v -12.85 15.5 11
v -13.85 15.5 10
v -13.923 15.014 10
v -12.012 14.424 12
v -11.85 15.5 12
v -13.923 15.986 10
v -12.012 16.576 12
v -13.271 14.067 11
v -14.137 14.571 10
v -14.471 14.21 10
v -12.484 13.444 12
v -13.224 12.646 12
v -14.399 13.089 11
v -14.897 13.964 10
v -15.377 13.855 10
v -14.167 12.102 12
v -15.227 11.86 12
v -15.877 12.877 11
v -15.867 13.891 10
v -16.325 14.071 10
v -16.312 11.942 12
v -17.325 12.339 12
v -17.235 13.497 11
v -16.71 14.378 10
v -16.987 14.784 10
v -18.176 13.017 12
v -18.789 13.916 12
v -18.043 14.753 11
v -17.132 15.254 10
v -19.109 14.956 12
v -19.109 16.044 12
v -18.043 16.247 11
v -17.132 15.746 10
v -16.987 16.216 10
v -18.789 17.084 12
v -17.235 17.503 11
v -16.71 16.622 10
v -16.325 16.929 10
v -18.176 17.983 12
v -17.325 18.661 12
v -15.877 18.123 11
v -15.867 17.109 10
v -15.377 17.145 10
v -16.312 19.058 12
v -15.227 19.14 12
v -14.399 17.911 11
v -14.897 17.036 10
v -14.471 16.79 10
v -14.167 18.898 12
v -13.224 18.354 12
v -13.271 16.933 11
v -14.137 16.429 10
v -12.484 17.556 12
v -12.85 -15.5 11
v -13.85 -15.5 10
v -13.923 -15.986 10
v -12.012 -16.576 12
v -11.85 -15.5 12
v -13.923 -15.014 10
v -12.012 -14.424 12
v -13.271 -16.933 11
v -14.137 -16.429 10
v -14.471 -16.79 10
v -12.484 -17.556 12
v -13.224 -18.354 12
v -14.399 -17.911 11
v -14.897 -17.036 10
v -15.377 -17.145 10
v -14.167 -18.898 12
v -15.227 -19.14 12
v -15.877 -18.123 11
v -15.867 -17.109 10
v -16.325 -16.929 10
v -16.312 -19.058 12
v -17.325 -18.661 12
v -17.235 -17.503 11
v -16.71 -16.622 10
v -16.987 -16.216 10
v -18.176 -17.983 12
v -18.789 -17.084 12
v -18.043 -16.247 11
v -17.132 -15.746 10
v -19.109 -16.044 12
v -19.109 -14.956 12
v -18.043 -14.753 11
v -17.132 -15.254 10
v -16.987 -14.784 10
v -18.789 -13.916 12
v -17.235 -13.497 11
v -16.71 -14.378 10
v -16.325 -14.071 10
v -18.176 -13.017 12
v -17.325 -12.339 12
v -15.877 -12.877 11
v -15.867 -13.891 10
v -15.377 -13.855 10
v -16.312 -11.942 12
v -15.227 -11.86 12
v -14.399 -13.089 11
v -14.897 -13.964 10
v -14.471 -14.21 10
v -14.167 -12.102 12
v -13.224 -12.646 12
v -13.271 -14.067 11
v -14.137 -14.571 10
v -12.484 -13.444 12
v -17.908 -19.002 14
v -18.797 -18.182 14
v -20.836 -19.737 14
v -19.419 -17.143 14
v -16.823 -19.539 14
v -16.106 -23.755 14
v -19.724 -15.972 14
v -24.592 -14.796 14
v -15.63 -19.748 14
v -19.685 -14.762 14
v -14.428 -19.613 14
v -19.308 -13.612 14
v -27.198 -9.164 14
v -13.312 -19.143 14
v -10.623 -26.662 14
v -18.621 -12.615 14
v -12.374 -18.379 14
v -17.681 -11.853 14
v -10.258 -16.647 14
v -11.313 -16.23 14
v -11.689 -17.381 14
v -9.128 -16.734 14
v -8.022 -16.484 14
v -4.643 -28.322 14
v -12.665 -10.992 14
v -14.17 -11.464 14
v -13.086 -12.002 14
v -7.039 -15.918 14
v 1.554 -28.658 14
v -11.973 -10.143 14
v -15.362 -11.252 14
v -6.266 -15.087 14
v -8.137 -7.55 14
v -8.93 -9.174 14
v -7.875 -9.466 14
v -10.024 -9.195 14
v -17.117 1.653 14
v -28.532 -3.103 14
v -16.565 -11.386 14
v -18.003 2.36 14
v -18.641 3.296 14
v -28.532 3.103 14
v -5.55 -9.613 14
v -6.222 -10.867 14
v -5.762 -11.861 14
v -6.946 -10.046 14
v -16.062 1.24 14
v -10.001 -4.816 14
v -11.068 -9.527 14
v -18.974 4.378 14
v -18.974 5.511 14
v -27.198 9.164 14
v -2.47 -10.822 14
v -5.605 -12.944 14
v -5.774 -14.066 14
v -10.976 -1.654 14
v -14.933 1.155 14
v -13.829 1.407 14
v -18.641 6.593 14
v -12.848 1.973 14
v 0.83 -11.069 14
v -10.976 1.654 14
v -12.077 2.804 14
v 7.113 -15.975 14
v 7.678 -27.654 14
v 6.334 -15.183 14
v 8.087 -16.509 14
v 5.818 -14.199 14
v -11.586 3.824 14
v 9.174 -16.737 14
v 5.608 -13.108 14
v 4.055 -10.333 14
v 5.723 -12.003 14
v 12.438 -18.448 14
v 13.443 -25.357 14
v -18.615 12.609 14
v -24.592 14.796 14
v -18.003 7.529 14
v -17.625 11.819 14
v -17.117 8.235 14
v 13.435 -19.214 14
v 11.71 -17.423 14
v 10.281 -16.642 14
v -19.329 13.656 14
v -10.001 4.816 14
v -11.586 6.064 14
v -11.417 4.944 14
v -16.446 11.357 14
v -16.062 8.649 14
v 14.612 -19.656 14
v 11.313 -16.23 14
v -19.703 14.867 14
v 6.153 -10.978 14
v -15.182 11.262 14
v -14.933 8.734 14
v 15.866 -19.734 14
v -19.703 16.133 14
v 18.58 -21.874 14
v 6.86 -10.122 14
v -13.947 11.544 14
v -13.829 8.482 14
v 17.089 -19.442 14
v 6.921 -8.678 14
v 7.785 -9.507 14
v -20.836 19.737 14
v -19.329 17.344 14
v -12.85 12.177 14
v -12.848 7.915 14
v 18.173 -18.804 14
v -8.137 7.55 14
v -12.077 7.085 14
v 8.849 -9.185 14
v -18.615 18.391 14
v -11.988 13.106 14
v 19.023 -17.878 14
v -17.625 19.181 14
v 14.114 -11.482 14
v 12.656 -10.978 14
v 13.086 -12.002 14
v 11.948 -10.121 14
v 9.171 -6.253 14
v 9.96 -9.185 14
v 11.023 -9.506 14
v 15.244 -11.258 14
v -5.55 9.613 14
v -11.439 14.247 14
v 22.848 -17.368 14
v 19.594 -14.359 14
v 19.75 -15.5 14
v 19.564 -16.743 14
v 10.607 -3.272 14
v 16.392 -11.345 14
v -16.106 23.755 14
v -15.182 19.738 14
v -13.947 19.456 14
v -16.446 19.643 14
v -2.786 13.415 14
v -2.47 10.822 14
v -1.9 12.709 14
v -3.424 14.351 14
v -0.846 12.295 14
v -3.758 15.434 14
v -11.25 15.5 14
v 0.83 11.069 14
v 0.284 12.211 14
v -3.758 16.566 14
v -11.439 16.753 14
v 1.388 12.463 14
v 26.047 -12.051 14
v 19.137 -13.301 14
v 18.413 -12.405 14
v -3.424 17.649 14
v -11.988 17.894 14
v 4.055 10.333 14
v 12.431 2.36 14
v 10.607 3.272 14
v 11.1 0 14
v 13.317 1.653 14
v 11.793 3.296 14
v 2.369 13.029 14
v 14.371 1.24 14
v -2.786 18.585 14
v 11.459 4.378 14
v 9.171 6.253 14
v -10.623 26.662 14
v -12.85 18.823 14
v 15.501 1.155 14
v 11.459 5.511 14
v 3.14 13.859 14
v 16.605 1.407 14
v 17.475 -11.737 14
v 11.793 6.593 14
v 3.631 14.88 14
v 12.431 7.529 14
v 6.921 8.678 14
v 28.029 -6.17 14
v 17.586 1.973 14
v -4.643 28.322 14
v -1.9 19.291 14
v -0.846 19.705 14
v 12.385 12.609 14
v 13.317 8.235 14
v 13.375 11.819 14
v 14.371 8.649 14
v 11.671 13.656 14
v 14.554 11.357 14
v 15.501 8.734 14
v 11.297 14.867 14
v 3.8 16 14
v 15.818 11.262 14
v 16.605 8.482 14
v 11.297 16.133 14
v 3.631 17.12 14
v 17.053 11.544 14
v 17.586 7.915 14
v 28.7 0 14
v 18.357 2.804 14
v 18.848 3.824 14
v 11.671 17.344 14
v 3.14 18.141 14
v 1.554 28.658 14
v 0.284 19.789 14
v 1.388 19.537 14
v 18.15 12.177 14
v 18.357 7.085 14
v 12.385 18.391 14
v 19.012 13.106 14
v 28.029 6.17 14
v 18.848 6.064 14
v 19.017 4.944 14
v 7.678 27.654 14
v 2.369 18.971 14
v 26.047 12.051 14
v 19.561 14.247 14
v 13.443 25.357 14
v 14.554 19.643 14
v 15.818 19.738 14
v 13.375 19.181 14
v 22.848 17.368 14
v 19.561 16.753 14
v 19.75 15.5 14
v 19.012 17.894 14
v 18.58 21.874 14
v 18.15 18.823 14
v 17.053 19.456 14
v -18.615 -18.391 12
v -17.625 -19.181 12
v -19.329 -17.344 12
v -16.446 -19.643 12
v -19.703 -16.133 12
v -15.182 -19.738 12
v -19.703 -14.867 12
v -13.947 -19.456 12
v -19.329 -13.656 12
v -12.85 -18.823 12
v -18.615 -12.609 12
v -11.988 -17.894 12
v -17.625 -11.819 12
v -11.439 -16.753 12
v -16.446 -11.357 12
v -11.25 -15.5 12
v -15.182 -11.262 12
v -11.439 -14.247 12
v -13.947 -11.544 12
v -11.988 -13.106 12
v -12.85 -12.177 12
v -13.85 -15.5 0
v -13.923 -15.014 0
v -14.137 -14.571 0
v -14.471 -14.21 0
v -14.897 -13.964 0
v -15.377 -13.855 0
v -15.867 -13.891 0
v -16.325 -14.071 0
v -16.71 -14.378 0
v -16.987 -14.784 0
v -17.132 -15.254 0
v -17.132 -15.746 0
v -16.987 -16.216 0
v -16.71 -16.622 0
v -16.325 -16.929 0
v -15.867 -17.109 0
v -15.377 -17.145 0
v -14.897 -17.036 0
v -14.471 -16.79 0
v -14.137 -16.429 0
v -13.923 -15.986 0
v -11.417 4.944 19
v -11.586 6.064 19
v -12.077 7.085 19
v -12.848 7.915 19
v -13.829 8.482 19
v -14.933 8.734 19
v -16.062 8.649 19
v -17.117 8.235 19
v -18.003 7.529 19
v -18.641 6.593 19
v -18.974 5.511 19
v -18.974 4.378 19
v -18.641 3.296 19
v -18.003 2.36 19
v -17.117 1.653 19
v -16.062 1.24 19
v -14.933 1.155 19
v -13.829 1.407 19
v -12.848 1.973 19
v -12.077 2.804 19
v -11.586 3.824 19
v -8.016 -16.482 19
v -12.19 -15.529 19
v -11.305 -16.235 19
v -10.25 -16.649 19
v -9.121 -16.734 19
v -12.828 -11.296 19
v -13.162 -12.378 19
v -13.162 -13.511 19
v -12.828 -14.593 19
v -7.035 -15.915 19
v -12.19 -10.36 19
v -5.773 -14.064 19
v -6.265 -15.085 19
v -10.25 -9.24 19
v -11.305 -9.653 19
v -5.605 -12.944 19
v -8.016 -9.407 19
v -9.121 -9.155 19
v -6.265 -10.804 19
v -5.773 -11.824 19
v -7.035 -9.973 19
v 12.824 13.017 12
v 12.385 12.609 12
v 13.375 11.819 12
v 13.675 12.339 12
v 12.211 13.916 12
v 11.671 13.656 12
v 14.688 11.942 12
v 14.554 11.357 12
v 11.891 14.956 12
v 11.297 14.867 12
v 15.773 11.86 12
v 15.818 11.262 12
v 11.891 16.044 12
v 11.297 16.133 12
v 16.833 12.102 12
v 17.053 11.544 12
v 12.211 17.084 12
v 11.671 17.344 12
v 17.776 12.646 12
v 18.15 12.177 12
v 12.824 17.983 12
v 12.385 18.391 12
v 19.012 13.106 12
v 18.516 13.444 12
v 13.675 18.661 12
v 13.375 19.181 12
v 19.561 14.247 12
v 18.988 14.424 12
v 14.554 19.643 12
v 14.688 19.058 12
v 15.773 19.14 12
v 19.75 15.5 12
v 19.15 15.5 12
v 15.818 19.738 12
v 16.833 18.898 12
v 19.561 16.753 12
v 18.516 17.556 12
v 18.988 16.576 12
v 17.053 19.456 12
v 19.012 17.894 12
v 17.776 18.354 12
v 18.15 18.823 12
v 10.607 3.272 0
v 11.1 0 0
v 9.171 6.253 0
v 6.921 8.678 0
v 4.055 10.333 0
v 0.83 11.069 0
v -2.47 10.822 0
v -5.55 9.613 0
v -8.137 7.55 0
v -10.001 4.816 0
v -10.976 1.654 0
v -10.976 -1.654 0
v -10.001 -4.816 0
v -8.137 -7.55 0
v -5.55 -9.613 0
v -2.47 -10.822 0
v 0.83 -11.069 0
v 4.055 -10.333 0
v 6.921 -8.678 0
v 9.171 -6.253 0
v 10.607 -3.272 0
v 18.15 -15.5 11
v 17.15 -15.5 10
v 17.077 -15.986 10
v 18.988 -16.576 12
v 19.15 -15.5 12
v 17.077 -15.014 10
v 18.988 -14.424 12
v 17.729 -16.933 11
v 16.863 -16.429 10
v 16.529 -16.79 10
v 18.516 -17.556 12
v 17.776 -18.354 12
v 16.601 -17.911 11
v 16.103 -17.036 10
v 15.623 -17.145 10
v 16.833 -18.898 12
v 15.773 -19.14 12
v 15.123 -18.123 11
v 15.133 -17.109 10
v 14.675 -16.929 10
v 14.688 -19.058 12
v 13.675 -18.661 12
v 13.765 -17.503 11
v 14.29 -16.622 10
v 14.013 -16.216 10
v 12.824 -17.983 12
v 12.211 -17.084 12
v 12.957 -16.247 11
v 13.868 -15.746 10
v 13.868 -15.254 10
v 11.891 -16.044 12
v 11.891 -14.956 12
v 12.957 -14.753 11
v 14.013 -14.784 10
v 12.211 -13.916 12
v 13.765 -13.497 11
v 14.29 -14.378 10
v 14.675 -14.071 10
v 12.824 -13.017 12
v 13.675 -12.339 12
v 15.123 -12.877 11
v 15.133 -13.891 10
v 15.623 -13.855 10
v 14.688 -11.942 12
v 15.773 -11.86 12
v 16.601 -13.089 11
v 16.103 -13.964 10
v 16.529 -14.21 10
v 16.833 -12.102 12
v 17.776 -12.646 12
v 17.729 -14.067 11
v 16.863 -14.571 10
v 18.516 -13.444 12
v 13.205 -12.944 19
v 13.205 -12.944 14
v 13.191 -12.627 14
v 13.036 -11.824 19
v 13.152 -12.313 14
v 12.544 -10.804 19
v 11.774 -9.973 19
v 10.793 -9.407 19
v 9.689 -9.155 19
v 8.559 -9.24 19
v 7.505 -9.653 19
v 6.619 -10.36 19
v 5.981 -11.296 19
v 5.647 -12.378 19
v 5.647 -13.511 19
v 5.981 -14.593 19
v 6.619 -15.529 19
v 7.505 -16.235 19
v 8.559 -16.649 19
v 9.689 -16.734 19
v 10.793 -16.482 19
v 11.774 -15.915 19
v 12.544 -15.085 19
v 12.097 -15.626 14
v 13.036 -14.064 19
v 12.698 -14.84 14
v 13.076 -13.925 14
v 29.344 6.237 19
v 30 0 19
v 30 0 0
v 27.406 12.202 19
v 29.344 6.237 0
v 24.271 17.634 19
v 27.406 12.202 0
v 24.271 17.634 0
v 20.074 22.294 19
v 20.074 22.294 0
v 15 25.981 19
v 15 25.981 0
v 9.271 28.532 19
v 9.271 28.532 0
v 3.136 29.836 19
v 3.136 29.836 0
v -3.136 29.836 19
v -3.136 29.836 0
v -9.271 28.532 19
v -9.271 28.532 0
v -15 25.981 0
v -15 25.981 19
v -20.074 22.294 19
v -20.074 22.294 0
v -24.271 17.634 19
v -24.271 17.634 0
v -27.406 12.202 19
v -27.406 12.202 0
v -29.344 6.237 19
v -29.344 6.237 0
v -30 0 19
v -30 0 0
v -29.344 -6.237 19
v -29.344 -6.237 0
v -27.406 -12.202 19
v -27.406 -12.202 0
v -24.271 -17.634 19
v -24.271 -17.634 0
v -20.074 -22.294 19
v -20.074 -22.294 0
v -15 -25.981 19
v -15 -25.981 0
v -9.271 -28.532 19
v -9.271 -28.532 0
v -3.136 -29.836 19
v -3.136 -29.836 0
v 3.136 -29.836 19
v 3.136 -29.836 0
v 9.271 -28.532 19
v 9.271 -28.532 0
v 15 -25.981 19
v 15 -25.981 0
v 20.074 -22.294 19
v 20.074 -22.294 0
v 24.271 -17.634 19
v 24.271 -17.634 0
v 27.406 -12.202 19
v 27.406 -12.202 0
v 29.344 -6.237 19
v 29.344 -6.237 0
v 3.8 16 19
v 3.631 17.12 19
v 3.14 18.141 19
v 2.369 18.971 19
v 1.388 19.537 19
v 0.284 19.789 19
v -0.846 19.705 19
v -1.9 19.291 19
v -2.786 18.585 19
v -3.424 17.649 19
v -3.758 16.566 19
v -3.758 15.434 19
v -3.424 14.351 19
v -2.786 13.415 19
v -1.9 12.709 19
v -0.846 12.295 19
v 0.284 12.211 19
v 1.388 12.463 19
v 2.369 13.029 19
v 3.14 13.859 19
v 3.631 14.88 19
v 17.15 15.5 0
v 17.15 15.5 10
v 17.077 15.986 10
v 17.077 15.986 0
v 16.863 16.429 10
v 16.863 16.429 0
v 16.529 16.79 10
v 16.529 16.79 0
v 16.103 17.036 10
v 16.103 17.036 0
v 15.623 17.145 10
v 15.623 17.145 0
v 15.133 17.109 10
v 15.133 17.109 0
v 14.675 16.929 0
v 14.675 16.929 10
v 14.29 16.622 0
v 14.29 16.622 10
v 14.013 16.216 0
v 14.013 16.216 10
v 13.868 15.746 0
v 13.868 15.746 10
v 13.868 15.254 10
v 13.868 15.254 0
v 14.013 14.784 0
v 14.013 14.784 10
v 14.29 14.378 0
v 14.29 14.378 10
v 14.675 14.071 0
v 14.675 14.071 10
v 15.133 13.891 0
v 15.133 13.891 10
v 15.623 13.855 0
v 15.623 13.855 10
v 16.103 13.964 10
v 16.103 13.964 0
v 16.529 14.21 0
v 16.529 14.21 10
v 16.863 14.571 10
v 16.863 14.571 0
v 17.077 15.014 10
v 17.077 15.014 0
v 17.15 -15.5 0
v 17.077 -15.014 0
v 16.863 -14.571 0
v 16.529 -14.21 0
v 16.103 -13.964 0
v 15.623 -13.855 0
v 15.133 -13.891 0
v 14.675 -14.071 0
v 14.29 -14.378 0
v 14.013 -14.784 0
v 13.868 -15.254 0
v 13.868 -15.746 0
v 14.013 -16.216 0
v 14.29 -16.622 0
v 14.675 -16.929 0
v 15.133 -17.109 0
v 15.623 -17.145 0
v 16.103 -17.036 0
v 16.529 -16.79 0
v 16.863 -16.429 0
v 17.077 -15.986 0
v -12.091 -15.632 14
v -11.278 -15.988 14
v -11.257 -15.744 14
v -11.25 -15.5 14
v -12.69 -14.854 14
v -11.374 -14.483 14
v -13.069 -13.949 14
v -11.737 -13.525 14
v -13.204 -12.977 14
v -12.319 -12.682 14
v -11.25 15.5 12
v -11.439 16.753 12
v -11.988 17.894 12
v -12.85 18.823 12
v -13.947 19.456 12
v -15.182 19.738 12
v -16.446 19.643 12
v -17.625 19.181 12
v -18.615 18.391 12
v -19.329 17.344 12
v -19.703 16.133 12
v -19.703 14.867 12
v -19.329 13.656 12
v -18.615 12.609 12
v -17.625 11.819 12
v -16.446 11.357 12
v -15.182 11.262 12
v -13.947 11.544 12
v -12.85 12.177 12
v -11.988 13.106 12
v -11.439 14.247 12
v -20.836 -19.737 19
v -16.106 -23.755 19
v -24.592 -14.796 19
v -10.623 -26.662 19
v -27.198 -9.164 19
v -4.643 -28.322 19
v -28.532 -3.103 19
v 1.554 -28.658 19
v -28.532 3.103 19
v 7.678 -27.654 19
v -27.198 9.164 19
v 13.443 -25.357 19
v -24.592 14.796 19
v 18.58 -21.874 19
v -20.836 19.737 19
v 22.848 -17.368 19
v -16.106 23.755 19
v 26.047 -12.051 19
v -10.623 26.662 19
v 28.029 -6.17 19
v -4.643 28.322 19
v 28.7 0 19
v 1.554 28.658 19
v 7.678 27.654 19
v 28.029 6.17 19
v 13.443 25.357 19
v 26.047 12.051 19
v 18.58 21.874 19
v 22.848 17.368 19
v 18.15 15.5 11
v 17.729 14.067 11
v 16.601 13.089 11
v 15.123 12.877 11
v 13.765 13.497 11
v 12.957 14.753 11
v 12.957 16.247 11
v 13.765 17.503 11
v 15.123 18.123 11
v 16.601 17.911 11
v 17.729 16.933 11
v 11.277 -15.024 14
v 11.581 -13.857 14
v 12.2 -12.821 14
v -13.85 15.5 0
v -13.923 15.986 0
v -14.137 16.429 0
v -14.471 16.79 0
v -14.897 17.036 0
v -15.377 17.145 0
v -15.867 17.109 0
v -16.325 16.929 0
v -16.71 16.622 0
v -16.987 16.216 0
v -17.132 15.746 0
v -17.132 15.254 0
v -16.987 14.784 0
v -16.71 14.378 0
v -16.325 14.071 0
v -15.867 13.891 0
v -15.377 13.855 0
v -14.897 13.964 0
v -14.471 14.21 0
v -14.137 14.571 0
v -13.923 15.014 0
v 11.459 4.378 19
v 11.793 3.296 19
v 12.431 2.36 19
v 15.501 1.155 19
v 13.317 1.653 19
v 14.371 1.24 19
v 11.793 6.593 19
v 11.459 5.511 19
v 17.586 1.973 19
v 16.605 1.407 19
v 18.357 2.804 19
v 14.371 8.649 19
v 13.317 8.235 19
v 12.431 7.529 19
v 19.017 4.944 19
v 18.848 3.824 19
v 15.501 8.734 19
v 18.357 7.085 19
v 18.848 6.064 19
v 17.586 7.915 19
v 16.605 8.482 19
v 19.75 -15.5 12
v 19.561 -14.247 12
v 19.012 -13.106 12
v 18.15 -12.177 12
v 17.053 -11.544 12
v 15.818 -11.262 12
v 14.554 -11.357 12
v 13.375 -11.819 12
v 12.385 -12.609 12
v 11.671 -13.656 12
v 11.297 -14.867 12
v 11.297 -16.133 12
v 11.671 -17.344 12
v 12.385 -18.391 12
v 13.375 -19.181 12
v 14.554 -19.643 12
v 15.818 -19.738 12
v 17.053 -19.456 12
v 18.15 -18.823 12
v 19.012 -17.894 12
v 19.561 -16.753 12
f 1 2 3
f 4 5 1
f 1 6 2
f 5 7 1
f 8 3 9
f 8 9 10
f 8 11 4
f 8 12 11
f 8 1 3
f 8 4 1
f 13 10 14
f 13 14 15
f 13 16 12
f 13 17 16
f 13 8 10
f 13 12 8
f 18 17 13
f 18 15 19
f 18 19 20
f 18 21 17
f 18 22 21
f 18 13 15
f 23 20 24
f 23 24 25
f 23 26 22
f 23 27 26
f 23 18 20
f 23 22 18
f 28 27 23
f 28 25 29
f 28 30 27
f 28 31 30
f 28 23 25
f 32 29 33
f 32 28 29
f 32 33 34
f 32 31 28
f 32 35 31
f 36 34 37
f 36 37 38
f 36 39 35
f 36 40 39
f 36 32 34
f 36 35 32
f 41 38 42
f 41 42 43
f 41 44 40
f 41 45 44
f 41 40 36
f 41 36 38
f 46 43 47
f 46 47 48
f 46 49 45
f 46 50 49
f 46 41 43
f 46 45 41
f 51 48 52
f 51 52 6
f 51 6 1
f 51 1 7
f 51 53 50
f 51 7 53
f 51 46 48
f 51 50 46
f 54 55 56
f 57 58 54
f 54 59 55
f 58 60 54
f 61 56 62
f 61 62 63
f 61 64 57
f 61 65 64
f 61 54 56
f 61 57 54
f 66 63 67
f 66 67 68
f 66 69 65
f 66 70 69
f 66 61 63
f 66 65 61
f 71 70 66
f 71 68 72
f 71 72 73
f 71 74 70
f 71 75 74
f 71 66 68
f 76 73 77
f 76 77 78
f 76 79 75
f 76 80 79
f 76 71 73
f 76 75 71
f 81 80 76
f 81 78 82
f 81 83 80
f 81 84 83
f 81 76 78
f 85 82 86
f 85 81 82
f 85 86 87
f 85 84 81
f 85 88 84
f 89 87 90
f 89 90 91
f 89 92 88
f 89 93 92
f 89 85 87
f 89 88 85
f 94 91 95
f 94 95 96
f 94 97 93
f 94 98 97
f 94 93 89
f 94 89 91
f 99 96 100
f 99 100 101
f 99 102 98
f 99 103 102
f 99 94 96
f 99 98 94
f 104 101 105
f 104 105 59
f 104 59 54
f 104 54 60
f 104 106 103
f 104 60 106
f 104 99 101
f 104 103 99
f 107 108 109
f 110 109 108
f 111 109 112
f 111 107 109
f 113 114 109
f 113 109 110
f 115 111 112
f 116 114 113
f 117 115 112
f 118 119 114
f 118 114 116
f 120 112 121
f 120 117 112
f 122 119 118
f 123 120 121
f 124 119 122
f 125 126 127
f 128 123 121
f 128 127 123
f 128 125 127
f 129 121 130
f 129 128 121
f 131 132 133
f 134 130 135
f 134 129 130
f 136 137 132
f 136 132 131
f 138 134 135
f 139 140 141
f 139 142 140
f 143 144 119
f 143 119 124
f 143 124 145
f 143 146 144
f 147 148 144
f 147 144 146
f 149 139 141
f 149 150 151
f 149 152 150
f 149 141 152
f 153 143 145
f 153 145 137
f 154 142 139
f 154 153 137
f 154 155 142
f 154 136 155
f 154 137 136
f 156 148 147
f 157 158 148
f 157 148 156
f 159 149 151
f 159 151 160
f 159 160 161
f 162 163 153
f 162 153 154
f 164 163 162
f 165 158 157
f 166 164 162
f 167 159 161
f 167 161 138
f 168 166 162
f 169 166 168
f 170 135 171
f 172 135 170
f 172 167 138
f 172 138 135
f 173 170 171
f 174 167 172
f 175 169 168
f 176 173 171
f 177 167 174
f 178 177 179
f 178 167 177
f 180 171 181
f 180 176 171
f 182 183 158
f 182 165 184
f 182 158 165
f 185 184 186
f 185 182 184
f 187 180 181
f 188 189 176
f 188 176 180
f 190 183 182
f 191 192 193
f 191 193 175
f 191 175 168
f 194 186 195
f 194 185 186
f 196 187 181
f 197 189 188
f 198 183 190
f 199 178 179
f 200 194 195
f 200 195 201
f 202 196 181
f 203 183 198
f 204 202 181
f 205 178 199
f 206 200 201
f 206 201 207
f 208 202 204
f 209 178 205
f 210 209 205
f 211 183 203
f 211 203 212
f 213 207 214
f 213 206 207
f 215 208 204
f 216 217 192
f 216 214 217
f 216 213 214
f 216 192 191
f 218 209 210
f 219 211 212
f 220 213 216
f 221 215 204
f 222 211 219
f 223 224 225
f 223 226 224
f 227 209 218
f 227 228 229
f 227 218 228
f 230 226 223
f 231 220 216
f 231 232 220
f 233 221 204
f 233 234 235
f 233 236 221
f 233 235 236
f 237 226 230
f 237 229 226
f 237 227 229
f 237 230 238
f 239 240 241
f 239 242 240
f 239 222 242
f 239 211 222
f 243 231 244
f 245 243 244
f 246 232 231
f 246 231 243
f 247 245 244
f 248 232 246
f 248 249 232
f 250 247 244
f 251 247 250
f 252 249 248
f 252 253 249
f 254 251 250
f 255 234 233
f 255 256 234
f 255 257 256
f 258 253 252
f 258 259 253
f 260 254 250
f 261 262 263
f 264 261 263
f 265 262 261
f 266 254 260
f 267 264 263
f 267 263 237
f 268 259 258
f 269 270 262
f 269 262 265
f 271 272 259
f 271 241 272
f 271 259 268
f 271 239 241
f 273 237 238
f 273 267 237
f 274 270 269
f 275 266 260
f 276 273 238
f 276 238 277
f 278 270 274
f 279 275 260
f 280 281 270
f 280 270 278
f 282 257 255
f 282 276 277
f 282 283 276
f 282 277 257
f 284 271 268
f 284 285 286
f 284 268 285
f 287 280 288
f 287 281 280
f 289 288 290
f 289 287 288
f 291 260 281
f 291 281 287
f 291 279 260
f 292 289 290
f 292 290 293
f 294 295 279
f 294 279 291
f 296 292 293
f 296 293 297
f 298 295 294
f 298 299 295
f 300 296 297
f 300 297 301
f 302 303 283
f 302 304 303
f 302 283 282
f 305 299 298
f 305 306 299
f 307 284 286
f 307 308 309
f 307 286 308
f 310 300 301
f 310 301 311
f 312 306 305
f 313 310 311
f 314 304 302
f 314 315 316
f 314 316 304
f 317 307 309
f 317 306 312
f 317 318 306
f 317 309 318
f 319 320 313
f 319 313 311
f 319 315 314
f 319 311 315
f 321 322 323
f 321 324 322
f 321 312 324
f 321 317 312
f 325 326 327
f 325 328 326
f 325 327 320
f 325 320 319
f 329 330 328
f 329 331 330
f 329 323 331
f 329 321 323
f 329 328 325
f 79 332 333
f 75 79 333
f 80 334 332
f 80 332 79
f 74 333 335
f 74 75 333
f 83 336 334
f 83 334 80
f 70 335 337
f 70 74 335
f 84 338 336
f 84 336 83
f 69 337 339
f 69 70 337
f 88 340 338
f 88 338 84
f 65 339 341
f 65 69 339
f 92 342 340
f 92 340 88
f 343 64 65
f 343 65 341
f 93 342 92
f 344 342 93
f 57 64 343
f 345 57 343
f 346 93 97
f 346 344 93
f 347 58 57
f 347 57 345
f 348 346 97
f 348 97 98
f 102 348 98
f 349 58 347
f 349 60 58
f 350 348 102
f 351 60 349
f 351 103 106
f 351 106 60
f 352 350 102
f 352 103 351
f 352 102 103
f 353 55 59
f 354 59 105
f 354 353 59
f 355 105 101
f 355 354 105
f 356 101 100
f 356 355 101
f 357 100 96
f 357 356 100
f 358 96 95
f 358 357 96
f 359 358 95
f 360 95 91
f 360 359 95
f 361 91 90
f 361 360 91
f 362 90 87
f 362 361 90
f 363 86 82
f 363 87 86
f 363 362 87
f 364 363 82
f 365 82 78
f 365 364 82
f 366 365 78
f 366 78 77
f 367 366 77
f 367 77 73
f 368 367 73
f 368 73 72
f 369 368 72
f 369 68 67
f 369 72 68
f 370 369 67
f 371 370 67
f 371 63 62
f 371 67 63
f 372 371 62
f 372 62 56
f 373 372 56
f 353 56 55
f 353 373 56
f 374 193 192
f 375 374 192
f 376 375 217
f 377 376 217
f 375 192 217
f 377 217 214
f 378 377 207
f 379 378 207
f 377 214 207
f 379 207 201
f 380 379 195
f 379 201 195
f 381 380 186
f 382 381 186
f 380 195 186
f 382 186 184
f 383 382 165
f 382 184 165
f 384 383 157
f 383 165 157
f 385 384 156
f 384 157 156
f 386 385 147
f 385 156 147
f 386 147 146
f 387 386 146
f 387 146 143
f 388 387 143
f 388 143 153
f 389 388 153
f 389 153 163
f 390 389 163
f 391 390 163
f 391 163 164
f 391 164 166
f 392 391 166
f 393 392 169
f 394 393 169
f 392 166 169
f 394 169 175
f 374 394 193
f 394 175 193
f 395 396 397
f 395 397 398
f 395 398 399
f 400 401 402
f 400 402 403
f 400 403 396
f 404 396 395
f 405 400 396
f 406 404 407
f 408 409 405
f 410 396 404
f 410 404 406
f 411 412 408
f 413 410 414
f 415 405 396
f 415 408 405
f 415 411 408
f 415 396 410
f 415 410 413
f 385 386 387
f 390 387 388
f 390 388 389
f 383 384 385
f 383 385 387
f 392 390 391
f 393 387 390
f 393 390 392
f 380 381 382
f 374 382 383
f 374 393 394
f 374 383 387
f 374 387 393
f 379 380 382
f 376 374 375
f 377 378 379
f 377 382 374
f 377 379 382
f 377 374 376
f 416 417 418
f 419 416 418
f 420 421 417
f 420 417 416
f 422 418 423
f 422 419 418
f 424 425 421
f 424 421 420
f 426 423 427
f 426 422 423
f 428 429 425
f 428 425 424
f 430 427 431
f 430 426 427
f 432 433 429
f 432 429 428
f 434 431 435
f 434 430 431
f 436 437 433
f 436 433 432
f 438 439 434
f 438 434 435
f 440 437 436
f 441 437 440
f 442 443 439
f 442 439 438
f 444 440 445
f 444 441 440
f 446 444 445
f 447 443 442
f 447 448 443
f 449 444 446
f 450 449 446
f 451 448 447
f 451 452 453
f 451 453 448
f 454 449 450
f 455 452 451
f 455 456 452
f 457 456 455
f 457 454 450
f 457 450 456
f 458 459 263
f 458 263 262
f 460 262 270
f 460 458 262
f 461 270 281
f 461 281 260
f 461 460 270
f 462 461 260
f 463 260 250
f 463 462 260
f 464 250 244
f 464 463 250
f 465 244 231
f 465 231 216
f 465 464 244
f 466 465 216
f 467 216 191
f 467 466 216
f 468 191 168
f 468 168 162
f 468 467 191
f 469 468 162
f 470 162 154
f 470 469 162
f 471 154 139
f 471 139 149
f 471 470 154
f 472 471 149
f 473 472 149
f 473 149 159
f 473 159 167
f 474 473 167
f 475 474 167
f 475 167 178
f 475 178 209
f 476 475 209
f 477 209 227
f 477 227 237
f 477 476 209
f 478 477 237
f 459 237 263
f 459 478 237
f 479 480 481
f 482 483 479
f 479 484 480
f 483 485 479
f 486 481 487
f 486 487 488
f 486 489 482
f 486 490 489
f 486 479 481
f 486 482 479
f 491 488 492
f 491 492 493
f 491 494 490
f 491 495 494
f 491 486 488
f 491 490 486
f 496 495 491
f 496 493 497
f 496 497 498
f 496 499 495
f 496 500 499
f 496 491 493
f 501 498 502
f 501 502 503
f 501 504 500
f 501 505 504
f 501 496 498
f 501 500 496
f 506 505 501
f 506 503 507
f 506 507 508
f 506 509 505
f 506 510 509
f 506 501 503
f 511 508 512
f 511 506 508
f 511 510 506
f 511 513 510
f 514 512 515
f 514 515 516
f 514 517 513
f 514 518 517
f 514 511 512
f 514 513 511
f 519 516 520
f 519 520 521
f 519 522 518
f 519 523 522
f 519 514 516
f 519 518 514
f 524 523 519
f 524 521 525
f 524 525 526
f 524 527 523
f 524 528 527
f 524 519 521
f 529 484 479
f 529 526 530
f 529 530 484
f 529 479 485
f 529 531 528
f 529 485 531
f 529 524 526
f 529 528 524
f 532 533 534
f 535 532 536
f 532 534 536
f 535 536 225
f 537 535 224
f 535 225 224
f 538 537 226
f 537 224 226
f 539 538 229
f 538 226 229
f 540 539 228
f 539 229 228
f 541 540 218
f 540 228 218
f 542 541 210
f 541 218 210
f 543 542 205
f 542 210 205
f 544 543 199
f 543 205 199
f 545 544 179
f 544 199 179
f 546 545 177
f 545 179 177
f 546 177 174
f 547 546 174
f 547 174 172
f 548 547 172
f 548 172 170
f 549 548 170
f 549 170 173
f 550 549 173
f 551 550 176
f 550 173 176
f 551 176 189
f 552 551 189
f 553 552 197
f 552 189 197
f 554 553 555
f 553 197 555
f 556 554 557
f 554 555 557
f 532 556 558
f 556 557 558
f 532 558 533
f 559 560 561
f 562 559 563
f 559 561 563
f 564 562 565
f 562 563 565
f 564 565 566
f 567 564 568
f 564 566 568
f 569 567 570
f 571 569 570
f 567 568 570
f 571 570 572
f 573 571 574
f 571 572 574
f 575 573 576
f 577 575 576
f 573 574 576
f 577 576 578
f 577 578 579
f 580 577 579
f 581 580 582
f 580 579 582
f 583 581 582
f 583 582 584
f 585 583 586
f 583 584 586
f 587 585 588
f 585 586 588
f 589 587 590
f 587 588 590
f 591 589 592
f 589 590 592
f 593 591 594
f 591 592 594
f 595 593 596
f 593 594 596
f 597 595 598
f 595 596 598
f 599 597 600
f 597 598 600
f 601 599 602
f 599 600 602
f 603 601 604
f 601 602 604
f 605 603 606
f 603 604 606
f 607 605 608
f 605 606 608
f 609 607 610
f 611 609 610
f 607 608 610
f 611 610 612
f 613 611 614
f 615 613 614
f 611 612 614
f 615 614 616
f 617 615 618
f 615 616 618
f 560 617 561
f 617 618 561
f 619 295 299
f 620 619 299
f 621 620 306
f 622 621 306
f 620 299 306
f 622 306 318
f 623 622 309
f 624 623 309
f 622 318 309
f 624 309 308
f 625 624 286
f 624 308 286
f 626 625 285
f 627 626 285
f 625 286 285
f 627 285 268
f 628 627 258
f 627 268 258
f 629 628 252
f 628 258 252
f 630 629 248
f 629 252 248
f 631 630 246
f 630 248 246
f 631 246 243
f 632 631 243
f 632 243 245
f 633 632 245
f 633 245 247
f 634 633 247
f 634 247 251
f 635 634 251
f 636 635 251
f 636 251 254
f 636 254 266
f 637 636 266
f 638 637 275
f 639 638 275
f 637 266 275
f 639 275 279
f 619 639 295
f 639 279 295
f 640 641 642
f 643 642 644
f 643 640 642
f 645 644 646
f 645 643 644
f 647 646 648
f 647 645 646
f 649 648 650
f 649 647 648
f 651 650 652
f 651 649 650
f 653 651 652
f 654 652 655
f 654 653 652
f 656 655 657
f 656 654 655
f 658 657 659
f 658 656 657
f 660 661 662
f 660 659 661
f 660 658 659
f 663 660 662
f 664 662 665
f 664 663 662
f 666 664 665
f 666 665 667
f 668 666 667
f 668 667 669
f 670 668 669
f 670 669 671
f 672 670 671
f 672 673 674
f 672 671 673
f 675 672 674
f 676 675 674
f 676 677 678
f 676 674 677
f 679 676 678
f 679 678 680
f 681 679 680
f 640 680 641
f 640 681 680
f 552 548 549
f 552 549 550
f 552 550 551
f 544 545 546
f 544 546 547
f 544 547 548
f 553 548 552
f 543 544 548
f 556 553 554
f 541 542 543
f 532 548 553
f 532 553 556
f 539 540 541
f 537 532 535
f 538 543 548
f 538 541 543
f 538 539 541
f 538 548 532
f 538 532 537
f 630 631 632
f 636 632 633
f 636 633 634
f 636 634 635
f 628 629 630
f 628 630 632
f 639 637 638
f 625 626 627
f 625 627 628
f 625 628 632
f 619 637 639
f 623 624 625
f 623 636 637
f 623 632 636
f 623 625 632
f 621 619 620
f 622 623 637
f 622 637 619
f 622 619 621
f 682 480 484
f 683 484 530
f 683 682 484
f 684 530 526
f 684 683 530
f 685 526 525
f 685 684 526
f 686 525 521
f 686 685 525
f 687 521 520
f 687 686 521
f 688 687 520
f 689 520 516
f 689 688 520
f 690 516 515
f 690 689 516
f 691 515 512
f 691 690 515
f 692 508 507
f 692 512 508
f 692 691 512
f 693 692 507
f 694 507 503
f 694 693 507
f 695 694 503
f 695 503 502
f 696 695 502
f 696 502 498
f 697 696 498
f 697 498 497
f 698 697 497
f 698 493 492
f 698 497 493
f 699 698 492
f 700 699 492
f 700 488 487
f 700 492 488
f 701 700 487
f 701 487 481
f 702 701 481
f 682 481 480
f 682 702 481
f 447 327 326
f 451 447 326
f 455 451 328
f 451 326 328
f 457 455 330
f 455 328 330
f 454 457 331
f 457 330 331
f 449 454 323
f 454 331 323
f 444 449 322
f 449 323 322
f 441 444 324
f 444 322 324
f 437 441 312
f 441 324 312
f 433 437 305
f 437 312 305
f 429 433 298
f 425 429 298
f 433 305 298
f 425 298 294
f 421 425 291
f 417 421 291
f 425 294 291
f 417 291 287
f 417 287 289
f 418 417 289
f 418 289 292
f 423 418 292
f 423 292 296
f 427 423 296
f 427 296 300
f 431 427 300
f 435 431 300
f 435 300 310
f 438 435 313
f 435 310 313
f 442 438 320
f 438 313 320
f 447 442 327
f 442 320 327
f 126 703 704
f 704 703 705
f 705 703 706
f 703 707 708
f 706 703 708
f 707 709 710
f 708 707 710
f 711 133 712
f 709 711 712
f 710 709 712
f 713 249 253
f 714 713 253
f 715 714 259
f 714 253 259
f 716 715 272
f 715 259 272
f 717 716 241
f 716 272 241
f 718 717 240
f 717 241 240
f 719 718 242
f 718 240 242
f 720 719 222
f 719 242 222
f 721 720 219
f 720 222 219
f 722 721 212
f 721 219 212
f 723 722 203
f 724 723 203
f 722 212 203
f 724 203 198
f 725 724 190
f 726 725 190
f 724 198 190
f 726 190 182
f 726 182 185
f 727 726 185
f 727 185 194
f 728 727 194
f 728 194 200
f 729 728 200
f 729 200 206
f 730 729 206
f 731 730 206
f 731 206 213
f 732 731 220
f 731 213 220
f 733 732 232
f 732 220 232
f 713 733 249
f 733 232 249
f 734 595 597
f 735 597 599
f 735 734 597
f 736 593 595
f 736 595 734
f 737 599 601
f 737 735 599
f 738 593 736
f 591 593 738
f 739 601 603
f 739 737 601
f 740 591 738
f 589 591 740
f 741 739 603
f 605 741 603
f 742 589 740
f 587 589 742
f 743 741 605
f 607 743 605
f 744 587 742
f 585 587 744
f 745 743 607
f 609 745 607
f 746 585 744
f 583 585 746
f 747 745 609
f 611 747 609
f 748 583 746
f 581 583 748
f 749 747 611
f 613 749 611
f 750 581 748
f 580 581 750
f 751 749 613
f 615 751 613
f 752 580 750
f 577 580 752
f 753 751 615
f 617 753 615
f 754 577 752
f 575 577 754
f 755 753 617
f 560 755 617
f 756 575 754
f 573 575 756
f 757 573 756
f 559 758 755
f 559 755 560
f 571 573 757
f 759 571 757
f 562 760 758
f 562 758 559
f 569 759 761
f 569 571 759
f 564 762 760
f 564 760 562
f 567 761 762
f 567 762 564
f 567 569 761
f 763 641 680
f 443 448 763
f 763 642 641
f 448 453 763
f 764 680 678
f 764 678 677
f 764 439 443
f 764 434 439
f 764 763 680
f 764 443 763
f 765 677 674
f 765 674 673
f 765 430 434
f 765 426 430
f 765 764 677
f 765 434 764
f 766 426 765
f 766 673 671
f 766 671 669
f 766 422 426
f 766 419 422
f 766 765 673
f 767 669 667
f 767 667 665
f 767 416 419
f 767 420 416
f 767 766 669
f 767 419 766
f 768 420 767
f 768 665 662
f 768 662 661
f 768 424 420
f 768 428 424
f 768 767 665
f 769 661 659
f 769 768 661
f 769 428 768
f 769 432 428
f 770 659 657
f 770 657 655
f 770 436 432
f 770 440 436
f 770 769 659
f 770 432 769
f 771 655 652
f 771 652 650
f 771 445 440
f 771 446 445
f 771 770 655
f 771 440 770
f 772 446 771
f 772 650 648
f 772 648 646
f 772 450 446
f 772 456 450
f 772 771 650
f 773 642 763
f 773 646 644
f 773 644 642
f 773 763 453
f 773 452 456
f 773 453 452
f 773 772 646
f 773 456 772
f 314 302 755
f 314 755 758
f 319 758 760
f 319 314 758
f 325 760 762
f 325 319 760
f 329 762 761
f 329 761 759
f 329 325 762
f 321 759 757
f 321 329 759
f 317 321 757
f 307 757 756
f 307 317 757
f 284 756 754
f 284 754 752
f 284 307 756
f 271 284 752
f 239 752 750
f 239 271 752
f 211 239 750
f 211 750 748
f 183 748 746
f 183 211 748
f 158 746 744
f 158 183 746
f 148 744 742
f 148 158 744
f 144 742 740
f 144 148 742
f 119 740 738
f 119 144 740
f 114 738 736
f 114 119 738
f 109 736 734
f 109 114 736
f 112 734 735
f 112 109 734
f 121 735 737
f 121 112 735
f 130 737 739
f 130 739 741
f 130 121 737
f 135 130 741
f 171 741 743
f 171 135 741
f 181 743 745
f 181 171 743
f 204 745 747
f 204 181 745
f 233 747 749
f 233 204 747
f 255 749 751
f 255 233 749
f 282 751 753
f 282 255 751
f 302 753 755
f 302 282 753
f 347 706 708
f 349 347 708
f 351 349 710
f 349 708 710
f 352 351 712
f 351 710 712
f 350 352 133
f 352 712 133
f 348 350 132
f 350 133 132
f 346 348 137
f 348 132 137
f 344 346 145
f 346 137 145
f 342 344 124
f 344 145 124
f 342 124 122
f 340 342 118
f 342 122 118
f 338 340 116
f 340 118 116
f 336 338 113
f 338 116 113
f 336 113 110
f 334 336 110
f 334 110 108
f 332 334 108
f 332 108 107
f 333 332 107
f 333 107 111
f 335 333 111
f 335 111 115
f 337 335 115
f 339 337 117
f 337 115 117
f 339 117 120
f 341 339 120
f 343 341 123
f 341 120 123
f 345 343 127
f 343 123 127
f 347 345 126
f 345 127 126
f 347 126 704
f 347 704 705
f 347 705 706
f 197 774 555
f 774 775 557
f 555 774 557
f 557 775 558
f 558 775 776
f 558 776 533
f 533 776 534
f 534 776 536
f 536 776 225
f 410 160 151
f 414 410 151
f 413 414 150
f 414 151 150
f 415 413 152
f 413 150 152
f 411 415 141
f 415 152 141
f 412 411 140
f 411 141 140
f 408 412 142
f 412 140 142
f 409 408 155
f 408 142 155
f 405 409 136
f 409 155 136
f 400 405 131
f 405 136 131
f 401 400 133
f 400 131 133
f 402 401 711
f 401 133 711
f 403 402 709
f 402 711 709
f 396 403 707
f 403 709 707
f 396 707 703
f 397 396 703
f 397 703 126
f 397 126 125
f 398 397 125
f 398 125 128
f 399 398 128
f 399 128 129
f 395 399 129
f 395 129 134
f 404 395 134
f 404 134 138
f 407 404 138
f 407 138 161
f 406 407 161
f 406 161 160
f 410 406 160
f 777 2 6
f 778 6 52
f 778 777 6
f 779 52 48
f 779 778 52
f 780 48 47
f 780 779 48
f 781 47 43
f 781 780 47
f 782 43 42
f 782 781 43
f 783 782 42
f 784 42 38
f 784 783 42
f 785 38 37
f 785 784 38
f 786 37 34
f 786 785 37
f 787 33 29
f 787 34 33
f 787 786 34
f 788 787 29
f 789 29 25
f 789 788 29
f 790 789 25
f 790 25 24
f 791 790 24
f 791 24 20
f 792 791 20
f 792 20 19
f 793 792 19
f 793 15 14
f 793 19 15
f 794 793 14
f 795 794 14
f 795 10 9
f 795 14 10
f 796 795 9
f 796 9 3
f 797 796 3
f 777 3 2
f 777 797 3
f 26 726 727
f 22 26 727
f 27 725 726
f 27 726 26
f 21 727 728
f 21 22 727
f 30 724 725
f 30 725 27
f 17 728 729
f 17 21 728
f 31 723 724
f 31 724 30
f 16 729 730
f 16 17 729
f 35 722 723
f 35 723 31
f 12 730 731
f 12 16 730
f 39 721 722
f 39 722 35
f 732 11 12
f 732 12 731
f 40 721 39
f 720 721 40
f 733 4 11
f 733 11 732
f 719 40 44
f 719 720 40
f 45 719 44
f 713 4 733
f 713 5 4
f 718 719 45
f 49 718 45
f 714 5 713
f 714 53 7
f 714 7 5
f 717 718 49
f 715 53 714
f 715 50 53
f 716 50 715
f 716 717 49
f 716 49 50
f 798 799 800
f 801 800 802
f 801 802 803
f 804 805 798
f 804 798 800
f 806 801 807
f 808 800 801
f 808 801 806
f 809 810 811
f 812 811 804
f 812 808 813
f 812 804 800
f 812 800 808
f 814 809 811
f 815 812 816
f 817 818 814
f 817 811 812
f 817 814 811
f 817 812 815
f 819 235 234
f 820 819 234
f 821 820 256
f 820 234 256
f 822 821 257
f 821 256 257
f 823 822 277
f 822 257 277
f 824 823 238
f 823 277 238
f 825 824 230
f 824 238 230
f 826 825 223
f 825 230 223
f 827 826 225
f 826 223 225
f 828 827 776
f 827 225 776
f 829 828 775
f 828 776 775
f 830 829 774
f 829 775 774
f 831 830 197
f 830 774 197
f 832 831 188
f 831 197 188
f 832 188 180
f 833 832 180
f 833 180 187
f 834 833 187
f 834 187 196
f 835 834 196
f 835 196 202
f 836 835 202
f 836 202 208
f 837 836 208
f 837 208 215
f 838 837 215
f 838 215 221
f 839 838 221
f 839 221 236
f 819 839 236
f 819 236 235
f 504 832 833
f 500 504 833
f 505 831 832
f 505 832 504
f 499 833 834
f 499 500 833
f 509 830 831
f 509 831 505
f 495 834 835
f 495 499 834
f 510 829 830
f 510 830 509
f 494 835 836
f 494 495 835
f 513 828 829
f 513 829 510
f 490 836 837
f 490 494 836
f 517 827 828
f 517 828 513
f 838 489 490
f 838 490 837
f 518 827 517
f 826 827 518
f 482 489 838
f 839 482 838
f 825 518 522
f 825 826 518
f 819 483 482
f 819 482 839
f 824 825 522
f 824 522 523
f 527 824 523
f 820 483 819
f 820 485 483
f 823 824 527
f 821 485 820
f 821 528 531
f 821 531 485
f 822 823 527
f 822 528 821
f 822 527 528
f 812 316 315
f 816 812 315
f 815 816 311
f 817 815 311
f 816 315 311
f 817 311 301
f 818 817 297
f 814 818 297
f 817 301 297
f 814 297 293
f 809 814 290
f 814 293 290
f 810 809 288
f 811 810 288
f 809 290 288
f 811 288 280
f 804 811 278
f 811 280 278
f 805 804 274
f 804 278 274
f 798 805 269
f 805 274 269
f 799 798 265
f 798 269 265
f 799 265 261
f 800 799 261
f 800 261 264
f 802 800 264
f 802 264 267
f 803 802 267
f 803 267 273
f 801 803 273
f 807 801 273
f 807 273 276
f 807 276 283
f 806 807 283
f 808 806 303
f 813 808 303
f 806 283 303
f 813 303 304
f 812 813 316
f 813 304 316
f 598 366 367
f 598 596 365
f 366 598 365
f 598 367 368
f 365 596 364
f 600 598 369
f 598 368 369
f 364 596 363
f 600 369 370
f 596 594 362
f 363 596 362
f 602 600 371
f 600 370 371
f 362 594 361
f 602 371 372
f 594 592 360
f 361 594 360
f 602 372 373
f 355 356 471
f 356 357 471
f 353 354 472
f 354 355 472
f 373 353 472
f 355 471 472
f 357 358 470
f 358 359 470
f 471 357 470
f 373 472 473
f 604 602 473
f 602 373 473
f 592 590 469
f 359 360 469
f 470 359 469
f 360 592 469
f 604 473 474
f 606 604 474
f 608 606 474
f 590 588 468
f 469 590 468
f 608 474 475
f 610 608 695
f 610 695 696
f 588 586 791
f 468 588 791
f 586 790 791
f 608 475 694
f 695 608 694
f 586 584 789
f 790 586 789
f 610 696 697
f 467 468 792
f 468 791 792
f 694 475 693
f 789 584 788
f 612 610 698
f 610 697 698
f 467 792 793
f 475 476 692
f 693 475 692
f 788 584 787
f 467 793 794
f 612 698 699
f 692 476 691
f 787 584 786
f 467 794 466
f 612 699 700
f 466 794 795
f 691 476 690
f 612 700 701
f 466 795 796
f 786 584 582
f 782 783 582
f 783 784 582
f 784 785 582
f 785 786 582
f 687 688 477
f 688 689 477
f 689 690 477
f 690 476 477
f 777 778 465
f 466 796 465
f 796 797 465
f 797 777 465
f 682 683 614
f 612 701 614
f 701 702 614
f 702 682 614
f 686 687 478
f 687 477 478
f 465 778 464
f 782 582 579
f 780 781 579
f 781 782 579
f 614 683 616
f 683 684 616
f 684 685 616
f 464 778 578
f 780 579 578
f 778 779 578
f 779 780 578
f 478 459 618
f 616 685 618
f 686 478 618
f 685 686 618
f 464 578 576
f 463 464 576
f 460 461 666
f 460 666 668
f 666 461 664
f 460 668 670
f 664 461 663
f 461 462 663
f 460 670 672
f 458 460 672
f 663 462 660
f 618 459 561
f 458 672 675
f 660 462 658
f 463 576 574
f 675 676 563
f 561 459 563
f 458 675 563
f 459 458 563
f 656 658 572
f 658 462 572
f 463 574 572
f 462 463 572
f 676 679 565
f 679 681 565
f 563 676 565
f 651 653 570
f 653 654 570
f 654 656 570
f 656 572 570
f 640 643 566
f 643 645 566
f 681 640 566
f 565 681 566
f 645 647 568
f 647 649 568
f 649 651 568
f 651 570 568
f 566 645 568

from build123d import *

# Parameters (mm, degrees)
ESQUISSE1_R             = 30
ESQUISSE1_R_2           = 11.1
ESQUISSE1_R_3           = 1.65
BOSS_EXTRU_1_DEPTH      = 14
ESQUISSE3_R             = 30
ESQUISSE3_R_2           = 28.7
ESQUISSE3_R_3           = 3.8
BOSS_EXTRU_2_DEPTH      = 5
ESQUISSE4_R             = 4.25
ENL_V_MAT_EXTRU_1_DEPTH = 2
CHANFREIN1_SIZE         = 2


with BuildPart() as part:
    # Esquisse1 → Boss.-Extru.1 (new body)
    with BuildSketch(Plane.XY):
        Circle(ESQUISSE1_R)
        Circle(ESQUISSE1_R_2, mode=Mode.SUBTRACT)
        with Locations((-15.5, 15.5)):
            Circle(ESQUISSE1_R_3, mode=Mode.SUBTRACT)
        with Locations((15.5, 15.5)):
            Circle(ESQUISSE1_R_3, mode=Mode.SUBTRACT)
        with Locations((15.5, -15.5)):
            Circle(ESQUISSE1_R_3, mode=Mode.SUBTRACT)
        with Locations((-15.5, -15.5)):
            Circle(ESQUISSE1_R_3, mode=Mode.SUBTRACT)
    extrude(amount=BOSS_EXTRU_1_DEPTH)

    # Esquisse3 → Boss.-Extru.2 (add)
    # profile 1 of 6: a face of its own
    with BuildSketch(Plane.XY.offset(14)):
        Circle(ESQUISSE3_R)
        Circle(ESQUISSE3_R_2, mode=Mode.SUBTRACT)
    # profile 2 of 6: a face of its own
    with BuildSketch(Plane.XY.offset(14)):
        with Locations((-15.216904261, 4.94427191)):
            Circle(ESQUISSE3_R_3)
    # profile 3 of 6: a face of its own
    with BuildSketch(Plane.XY.offset(14)):
        with Locations((0, 16)):
            Circle(ESQUISSE3_R_3)
    # profile 4 of 6: a face of its own
    with BuildSketch(Plane.XY.offset(14)):
        with Locations((9.404564037, -12.94427191)):
            Circle(ESQUISSE3_R_3)
    # profile 5 of 6: a face of its own
    with BuildSketch(Plane.XY.offset(14)):
        with Locations((-9.404564037, -12.94427191)):
            Circle(ESQUISSE3_R_3)
    # profile 6 of 6: a face of its own
    with BuildSketch(Plane.XY.offset(14)):
        with Locations((15.216904261, 4.94427191)):
            Circle(ESQUISSE3_R_3)
    extrude(amount=BOSS_EXTRU_2_DEPTH)

    # Esquisse4 → Enlèv. mat.-Extru.1 (cut)
    with BuildSketch(Plane.XY.offset(14)):
        with Locations((-15.5, 15.5)):
            Circle(ESQUISSE4_R)
        with Locations((15.5, 15.5)):
            Circle(ESQUISSE4_R)
        with Locations((15.5, -15.5)):
            Circle(ESQUISSE4_R)
        with Locations((-15.5, -15.5)):
            Circle(ESQUISSE4_R)
    extrude(amount=-ENL_V_MAT_EXTRU_1_DEPTH, mode=Mode.SUBTRACT)

    # Chanfrein1
    chanfrein1_edges = [part.edges().sort_by_distance(p)[0] for p in [
        (-17.15, -15.5, 12),
        (13.85, -15.5, 12),
        (13.85, 15.5, 12),
        (-17.15, 15.5, 12),
    ]]
    chamfer(chanfrein1_edges, length=CHANFREIN1_SIZE)


solid = part.part
